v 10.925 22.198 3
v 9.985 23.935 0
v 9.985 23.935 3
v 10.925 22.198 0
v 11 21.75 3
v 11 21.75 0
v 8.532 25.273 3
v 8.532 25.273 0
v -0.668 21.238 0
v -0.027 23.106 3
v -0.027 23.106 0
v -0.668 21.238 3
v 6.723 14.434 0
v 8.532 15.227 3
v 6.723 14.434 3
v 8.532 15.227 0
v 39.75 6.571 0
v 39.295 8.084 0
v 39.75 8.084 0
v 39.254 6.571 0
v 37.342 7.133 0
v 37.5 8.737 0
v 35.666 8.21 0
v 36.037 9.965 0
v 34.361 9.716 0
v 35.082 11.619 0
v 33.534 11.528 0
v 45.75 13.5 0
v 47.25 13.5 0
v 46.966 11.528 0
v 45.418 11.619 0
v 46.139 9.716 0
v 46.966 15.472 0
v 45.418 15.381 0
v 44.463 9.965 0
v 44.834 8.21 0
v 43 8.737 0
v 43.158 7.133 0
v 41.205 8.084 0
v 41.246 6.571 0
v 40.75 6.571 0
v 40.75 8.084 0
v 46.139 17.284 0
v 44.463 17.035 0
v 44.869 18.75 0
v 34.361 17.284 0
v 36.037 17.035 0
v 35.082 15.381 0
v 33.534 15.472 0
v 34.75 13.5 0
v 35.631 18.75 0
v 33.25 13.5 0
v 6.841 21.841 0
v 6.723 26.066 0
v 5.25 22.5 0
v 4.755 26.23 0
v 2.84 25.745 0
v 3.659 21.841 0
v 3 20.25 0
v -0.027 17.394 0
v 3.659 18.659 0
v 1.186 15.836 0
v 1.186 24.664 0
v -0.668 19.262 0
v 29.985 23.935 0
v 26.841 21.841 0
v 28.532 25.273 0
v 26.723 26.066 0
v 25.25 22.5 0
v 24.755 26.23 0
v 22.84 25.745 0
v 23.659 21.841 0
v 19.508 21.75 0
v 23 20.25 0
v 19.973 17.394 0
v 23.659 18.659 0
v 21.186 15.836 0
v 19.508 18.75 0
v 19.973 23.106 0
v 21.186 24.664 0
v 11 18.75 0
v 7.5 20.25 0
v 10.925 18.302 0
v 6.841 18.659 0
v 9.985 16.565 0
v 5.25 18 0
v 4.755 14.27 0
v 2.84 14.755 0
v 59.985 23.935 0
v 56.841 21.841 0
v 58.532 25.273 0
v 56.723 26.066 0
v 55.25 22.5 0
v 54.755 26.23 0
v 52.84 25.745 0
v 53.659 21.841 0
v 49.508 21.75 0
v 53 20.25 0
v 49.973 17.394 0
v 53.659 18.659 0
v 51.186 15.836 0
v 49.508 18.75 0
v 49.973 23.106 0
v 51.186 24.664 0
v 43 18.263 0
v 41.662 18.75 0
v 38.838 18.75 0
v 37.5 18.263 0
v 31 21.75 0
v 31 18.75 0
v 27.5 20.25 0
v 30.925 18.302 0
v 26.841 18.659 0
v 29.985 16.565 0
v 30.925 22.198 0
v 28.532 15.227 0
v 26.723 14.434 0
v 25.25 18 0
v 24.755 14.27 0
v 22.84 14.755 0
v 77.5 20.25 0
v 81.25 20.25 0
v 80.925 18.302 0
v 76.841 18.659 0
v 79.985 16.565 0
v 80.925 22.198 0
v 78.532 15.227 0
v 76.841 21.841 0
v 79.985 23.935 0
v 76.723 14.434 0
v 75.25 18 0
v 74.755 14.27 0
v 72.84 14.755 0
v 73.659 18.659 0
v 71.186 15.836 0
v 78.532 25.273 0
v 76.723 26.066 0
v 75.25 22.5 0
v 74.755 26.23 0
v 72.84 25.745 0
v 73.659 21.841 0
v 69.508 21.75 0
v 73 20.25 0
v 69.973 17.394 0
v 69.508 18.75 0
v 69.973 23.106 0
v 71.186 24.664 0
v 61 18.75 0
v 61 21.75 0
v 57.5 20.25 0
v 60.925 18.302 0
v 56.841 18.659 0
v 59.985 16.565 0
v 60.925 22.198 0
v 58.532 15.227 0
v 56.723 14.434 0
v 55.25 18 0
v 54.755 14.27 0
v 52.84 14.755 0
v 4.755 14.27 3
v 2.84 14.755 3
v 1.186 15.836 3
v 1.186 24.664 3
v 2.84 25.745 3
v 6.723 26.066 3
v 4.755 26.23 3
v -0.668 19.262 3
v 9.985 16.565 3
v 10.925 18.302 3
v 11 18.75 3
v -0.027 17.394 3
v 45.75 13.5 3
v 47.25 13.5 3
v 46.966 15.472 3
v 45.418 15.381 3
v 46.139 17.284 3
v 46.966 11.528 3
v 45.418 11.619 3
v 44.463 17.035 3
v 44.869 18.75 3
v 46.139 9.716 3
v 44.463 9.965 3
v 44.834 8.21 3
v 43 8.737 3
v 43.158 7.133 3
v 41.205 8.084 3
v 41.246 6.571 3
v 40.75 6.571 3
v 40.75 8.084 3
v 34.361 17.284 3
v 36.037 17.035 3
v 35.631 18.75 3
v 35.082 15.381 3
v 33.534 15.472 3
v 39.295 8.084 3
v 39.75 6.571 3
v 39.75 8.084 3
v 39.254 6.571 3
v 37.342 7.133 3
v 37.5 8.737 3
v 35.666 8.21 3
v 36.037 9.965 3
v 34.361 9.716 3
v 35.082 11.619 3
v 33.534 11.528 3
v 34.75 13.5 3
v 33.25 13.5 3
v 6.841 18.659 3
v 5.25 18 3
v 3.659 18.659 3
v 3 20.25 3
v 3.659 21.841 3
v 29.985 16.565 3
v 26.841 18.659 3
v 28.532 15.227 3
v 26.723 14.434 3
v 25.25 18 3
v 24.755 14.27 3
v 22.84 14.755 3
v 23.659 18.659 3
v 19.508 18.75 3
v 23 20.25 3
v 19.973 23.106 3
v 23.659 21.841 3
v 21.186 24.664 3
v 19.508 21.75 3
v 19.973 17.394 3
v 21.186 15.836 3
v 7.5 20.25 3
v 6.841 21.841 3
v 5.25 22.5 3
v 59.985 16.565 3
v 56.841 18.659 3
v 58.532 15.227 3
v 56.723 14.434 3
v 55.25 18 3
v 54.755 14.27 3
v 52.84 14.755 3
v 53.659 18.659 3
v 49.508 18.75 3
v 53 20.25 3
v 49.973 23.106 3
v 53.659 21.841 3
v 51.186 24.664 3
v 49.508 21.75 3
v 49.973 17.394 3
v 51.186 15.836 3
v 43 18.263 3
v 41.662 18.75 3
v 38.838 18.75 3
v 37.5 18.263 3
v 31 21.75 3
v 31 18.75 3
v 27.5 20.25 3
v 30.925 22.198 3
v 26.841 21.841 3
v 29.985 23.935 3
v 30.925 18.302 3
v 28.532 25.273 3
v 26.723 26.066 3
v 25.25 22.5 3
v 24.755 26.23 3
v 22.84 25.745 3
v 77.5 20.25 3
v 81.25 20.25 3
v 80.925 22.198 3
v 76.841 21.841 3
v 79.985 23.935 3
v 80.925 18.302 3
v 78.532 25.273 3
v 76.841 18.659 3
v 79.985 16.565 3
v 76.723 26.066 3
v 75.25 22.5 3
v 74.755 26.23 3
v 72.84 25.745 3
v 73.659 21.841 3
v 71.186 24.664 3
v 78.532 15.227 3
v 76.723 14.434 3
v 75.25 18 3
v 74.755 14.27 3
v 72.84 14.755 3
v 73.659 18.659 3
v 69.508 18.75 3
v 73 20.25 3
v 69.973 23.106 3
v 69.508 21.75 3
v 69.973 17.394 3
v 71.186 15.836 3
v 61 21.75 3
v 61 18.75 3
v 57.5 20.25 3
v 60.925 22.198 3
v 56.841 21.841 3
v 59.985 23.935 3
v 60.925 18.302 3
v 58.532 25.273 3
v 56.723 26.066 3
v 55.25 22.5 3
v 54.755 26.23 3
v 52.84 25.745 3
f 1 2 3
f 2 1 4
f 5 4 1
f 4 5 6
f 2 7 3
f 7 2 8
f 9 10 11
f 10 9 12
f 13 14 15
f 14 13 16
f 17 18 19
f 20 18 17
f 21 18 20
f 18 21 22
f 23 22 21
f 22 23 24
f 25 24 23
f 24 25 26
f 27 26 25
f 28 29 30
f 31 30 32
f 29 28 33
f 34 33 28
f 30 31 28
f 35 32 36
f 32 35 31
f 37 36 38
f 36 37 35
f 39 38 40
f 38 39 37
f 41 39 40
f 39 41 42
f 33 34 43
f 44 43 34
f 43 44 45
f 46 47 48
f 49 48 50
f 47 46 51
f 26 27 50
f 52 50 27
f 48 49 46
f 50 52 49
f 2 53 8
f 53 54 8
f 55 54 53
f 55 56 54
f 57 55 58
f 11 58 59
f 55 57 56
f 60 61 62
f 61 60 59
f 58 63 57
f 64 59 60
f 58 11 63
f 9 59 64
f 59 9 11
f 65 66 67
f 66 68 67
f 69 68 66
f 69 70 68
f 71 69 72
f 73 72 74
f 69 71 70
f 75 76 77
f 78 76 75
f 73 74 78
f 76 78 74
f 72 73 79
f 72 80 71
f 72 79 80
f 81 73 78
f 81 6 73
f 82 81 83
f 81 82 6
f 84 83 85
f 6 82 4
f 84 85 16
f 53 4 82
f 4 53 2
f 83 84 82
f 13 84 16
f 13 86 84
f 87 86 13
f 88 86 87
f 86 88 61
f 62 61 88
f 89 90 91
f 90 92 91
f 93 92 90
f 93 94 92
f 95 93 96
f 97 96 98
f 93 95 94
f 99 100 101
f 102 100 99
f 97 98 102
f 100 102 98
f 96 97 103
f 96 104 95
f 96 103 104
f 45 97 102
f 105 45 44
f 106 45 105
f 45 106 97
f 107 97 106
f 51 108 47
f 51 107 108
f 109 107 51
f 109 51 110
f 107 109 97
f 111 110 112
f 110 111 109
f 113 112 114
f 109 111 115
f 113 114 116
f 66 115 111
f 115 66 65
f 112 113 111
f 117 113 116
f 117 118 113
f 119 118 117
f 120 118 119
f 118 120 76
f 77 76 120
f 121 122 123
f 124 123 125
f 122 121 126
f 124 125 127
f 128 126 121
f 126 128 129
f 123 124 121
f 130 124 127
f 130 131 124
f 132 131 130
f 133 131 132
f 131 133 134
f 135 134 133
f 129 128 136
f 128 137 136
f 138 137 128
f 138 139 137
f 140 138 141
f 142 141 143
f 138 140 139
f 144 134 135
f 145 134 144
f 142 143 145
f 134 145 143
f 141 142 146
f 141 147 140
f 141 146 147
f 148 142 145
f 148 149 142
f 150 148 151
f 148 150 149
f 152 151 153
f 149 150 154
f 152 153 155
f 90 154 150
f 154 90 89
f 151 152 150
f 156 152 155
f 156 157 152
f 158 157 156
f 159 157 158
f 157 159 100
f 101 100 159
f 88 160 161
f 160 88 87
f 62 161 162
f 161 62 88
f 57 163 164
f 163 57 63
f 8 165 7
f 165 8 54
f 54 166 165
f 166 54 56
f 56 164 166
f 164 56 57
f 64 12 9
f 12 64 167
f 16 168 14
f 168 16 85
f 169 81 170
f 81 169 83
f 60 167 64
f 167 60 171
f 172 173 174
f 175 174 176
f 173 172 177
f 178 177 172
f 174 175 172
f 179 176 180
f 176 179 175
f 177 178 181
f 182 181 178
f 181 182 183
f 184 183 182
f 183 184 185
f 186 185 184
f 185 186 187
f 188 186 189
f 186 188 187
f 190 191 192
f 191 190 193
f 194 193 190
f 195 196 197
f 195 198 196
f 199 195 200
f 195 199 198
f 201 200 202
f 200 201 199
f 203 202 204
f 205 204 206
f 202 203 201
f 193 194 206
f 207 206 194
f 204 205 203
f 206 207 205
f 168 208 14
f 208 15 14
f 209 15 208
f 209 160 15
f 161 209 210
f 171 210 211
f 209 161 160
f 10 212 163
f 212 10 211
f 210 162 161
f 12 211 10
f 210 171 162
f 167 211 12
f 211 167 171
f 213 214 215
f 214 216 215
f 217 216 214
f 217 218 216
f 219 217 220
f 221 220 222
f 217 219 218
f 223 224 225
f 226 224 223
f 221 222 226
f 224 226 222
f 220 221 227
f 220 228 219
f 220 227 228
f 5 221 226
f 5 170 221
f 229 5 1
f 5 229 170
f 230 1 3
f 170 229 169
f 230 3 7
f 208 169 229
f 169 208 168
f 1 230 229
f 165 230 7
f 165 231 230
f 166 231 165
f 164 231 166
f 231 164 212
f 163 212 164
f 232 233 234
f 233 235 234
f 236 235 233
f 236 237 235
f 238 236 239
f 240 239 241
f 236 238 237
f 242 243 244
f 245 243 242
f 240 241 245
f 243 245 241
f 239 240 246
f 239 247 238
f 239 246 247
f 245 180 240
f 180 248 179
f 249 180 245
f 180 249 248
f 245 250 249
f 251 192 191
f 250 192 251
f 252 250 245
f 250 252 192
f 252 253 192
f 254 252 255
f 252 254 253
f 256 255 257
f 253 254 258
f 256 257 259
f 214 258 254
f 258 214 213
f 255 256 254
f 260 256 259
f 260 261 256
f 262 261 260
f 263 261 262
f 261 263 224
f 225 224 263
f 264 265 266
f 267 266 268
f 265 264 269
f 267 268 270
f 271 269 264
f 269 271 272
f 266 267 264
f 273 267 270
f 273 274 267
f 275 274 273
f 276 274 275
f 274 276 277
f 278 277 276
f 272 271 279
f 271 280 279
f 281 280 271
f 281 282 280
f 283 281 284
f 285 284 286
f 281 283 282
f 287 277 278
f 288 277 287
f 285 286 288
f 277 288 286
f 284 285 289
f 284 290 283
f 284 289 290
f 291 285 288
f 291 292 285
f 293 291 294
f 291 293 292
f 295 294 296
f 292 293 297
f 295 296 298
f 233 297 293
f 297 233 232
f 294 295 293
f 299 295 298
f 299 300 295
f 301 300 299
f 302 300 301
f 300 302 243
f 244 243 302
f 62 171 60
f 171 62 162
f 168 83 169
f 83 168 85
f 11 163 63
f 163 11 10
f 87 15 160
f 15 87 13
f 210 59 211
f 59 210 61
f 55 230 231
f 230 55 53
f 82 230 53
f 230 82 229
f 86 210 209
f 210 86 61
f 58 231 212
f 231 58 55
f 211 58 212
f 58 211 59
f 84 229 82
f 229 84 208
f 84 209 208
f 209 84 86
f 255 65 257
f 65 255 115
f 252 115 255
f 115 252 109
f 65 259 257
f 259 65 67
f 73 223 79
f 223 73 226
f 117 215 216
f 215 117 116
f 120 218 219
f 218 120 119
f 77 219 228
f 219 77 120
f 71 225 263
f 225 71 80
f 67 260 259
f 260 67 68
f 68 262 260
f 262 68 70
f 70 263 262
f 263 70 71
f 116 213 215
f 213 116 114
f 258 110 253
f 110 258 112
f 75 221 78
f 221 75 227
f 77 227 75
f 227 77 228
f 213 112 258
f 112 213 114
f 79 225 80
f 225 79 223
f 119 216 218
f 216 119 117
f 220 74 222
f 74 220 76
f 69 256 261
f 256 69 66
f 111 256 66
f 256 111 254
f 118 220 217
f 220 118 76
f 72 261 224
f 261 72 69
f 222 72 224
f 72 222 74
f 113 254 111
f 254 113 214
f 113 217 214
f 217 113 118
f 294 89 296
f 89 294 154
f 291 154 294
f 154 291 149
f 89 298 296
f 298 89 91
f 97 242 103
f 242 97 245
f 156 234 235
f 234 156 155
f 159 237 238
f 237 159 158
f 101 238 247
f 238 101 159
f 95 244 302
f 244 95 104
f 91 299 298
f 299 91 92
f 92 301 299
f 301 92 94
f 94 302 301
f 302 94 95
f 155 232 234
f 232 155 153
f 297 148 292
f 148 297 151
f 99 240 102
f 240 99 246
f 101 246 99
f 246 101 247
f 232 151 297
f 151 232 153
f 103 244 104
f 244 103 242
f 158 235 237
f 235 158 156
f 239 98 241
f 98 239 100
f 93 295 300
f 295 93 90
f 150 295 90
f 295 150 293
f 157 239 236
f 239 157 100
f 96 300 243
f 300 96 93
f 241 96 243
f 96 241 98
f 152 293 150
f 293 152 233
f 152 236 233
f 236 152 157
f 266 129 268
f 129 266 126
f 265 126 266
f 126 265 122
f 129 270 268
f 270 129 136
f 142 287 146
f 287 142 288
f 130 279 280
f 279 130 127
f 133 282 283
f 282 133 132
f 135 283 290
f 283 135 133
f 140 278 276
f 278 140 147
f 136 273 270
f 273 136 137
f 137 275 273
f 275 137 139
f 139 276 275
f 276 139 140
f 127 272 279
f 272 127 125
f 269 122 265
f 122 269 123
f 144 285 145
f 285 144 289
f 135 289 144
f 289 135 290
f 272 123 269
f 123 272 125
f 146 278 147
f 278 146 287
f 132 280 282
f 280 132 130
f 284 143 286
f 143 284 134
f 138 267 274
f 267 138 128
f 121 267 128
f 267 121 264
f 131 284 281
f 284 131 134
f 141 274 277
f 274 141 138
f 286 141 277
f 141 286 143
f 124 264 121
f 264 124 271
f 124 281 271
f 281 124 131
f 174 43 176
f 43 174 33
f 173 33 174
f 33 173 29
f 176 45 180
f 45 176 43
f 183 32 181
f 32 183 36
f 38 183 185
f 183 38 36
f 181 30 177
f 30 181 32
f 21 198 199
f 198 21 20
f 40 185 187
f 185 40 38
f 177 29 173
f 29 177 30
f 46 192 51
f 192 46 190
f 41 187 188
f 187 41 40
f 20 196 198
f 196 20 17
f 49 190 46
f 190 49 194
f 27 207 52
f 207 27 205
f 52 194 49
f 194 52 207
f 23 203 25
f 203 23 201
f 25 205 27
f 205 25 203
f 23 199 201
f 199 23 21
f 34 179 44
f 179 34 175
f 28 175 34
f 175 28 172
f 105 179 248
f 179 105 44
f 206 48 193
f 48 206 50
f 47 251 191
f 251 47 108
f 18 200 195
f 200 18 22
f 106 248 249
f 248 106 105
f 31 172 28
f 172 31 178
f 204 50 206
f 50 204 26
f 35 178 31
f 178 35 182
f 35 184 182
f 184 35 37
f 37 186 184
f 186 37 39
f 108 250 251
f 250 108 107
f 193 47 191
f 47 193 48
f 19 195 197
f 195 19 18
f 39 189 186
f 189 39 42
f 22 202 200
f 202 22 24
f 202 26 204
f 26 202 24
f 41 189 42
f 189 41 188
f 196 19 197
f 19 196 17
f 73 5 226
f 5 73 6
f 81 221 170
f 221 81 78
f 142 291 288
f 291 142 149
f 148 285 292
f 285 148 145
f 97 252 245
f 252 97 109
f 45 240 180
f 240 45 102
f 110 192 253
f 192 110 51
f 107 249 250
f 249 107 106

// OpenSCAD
height = 3; //mm
squoojefactor = 1; //mm
screw = 3.5 + squoojefactor; //mm, ie a loose M3
wire = 1 + squoojefactor; //mm
thick = 3; //mm
pen = 10 + squoojefactor;

length = 60; //mm

pairDistance = 20; //mm, distance between hole centres
armDistance = 30; //mm, distance between inner hole centres
width = 15;




//arm holes
translate([thick + (screw/2),                thick + (screw/2) + width, 0]) joint();
translate([thick + (screw/2) + pairDistance, thick + (screw/2) + width, 0]) joint();
translate([pairDistance + armDistance + thick + (screw/2), thick + (screw/2) + width, 0]) joint();
translate([pairDistance + armDistance + thick + (screw/2) + pairDistance, thick + (screw/2) + width , 0]) joint();

//pen hole
translate([(pairDistance + armDistance + pairDistance) / 2 + thick + (screw/2),   width + (pen/2) + thick -(1.5*thick+(pen/2)), 0]) penholder();

//end bars
translate([2*thick + screw, (width) + (screw/2) + (thick/2), 0]) cube([pairDistance - screw - (2*thick), thick, height]);
translate([2*thick + screw + pairDistance + armDistance, (width) + (screw/2) + (thick/2), 0]) cube([pairDistance - screw - (2*thick), thick, height]);

//mid bar
translate([(2*thick) + screw  + pairDistance, (width) + (screw/2) + (thick/2), 0]) cube([armDistance - screw - (2*thick), thick, height]);



//base bar
//translate([(2*thick) + screw  + pairDistance, (screw/2) + (thick/2), 0]) cube([armDistance - screw - (2*thick), thick, height]);

//up bars
//translate([thick/2 + pairDistance + thick + screw/2, screw + thick, 0]) rotate([0,0,90]) cube([width - screw, thick, height]);
//translate([thick/2 + pairDistance + thick + screw/2 + armDistance, screw + thick, 0]) rotate([0,0,90]) cube([width - screw, thick, height]);


module joint(){
difference(){
	cylinder(h=height, d=thick + 2*screw);
	cylinder(h=height, d=screw);
	}
}

module penholder(){
difference(){
	cylinder(h=height, d=thick + pen);
	cylinder(h=height, d=pen);
	translate([-.5, -(pen/2)-thick, 0]) cube([1, 2*thick, height]);
	}
}
